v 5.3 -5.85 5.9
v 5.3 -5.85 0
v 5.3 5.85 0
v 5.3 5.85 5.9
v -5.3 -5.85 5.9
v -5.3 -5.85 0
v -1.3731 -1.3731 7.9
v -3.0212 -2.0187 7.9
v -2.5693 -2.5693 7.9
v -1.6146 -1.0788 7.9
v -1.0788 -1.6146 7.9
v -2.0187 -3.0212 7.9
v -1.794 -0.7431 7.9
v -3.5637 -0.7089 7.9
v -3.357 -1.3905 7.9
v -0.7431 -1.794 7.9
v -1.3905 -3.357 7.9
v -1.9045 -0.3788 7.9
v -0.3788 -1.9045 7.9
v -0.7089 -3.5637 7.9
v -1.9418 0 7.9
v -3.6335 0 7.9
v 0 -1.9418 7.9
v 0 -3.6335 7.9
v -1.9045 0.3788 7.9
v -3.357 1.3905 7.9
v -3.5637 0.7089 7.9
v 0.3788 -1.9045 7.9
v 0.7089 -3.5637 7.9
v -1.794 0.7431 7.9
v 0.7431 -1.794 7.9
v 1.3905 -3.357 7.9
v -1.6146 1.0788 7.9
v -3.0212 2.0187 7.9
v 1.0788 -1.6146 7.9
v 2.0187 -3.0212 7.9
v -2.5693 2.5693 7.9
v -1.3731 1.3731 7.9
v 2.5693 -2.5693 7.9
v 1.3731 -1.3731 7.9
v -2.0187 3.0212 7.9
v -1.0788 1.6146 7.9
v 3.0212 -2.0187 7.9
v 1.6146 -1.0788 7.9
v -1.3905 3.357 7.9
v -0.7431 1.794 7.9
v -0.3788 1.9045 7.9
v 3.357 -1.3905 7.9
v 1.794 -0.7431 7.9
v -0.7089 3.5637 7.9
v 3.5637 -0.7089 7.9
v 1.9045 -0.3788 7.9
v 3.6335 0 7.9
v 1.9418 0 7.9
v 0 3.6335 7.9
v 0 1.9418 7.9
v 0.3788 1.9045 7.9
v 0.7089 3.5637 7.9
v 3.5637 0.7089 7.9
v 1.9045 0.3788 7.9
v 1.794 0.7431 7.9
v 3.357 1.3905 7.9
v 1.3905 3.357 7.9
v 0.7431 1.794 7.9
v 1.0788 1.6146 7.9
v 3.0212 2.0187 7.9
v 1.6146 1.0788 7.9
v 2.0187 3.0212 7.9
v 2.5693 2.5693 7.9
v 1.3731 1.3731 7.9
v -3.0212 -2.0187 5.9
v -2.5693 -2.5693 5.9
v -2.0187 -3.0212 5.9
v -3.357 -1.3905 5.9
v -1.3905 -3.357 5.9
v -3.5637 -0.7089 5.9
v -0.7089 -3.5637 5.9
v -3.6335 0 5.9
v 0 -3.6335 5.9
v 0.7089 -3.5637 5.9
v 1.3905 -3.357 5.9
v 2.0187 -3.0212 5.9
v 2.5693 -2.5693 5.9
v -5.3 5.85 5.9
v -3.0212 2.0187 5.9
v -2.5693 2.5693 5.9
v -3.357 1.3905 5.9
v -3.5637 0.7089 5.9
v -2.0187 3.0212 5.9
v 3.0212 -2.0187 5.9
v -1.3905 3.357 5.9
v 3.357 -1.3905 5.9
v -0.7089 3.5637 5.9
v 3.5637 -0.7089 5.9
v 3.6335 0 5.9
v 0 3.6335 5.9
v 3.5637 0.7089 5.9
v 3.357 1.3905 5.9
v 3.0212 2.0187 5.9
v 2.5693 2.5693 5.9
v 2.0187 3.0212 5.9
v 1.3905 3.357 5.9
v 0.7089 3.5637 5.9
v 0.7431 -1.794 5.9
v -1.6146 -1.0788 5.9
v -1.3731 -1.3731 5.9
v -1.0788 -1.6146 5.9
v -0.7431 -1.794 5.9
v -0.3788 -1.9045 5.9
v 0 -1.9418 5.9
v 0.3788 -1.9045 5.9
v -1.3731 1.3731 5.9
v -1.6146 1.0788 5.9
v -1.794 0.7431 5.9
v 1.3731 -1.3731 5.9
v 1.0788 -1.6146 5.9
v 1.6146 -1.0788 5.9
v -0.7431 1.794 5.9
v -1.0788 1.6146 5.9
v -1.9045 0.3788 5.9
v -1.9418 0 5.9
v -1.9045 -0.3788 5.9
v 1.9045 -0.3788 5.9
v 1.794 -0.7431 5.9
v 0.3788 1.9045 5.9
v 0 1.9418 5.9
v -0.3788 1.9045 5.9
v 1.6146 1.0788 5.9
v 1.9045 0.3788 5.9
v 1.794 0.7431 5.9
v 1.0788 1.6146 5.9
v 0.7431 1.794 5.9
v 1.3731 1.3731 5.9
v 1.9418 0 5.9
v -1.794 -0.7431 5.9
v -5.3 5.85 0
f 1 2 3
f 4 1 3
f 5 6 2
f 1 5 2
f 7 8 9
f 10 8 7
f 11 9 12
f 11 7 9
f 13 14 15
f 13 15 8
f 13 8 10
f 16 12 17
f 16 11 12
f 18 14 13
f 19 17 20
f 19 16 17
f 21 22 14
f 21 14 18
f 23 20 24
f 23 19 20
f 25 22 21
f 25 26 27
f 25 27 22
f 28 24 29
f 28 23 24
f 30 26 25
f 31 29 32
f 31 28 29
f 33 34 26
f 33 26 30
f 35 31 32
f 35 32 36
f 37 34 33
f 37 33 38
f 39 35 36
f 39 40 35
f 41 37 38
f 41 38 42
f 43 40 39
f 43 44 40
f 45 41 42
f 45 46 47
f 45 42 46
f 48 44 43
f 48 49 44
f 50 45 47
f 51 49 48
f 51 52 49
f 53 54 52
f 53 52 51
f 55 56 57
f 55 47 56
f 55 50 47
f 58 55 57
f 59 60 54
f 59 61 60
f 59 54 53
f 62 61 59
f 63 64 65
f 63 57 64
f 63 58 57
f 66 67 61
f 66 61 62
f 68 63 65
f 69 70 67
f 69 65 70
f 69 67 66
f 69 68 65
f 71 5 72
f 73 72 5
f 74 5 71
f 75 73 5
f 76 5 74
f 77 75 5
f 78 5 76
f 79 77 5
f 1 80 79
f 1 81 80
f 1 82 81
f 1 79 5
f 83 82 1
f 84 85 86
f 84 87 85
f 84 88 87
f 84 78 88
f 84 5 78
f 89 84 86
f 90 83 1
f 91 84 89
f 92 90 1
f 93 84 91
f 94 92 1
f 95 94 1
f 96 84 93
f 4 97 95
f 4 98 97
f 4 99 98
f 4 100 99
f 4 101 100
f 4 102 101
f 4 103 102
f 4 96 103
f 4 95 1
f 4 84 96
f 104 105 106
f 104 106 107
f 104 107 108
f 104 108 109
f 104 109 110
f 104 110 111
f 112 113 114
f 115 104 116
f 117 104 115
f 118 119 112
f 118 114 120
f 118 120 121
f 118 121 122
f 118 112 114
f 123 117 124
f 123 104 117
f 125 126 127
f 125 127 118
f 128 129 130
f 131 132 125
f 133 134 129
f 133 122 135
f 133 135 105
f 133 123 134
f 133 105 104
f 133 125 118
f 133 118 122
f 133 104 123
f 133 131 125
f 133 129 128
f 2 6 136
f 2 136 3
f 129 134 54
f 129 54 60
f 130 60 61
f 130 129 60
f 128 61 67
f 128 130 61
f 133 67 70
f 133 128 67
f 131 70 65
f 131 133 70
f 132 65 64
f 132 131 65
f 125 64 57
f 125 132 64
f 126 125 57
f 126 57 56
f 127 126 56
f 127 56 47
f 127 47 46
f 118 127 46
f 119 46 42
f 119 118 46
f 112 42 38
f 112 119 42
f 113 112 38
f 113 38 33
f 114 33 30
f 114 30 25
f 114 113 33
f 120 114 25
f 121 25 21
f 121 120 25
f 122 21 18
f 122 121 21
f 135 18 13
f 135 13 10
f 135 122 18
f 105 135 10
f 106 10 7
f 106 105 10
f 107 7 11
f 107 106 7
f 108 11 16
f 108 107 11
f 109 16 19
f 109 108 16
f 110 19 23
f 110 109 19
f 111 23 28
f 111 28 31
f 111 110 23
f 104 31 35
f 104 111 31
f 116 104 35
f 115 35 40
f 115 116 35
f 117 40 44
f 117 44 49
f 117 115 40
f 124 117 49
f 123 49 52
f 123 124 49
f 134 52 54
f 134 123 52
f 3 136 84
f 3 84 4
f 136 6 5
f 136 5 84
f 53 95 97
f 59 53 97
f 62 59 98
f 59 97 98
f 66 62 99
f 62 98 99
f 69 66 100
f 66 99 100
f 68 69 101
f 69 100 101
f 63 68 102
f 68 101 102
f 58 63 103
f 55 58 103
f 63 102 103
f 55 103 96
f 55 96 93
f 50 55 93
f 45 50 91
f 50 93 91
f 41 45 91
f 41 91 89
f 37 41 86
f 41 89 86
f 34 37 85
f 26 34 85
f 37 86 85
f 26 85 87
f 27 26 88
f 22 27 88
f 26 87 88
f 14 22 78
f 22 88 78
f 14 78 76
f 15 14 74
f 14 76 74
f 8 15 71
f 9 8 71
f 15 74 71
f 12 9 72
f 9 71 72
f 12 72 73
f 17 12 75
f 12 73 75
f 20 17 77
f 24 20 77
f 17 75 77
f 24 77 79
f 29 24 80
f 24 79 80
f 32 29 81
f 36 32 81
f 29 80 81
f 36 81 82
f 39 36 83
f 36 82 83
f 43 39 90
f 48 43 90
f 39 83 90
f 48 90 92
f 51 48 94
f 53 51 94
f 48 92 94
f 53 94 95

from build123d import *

# Parameters (mm, degrees)
ESQUISSE1_W        = 10.6
ESQUISSE1_H        = 11.7
BOSS_EXTRU_1_DEPTH = 5.9
ESQUISSE2_R        = 3.633546232
ESQUISSE2_R_2      = 1.941835626
BOSS_EXTRU_2_DEPTH = 2


with BuildPart() as part:
    # Esquisse1 → Boss.-Extru.1 (new body)
    with BuildSketch(Plane.XY):
        Rectangle(ESQUISSE1_W, ESQUISSE1_H)
    extrude(amount=BOSS_EXTRU_1_DEPTH)

    # Esquisse2 → Boss.-Extru.2 (add)
    with BuildSketch(Plane.XY.offset(5.9)):
        Circle(ESQUISSE2_R)
        Circle(ESQUISSE2_R_2, mode=Mode.SUBTRACT)
    extrude(amount=BOSS_EXTRU_2_DEPTH)


solid = part.part
